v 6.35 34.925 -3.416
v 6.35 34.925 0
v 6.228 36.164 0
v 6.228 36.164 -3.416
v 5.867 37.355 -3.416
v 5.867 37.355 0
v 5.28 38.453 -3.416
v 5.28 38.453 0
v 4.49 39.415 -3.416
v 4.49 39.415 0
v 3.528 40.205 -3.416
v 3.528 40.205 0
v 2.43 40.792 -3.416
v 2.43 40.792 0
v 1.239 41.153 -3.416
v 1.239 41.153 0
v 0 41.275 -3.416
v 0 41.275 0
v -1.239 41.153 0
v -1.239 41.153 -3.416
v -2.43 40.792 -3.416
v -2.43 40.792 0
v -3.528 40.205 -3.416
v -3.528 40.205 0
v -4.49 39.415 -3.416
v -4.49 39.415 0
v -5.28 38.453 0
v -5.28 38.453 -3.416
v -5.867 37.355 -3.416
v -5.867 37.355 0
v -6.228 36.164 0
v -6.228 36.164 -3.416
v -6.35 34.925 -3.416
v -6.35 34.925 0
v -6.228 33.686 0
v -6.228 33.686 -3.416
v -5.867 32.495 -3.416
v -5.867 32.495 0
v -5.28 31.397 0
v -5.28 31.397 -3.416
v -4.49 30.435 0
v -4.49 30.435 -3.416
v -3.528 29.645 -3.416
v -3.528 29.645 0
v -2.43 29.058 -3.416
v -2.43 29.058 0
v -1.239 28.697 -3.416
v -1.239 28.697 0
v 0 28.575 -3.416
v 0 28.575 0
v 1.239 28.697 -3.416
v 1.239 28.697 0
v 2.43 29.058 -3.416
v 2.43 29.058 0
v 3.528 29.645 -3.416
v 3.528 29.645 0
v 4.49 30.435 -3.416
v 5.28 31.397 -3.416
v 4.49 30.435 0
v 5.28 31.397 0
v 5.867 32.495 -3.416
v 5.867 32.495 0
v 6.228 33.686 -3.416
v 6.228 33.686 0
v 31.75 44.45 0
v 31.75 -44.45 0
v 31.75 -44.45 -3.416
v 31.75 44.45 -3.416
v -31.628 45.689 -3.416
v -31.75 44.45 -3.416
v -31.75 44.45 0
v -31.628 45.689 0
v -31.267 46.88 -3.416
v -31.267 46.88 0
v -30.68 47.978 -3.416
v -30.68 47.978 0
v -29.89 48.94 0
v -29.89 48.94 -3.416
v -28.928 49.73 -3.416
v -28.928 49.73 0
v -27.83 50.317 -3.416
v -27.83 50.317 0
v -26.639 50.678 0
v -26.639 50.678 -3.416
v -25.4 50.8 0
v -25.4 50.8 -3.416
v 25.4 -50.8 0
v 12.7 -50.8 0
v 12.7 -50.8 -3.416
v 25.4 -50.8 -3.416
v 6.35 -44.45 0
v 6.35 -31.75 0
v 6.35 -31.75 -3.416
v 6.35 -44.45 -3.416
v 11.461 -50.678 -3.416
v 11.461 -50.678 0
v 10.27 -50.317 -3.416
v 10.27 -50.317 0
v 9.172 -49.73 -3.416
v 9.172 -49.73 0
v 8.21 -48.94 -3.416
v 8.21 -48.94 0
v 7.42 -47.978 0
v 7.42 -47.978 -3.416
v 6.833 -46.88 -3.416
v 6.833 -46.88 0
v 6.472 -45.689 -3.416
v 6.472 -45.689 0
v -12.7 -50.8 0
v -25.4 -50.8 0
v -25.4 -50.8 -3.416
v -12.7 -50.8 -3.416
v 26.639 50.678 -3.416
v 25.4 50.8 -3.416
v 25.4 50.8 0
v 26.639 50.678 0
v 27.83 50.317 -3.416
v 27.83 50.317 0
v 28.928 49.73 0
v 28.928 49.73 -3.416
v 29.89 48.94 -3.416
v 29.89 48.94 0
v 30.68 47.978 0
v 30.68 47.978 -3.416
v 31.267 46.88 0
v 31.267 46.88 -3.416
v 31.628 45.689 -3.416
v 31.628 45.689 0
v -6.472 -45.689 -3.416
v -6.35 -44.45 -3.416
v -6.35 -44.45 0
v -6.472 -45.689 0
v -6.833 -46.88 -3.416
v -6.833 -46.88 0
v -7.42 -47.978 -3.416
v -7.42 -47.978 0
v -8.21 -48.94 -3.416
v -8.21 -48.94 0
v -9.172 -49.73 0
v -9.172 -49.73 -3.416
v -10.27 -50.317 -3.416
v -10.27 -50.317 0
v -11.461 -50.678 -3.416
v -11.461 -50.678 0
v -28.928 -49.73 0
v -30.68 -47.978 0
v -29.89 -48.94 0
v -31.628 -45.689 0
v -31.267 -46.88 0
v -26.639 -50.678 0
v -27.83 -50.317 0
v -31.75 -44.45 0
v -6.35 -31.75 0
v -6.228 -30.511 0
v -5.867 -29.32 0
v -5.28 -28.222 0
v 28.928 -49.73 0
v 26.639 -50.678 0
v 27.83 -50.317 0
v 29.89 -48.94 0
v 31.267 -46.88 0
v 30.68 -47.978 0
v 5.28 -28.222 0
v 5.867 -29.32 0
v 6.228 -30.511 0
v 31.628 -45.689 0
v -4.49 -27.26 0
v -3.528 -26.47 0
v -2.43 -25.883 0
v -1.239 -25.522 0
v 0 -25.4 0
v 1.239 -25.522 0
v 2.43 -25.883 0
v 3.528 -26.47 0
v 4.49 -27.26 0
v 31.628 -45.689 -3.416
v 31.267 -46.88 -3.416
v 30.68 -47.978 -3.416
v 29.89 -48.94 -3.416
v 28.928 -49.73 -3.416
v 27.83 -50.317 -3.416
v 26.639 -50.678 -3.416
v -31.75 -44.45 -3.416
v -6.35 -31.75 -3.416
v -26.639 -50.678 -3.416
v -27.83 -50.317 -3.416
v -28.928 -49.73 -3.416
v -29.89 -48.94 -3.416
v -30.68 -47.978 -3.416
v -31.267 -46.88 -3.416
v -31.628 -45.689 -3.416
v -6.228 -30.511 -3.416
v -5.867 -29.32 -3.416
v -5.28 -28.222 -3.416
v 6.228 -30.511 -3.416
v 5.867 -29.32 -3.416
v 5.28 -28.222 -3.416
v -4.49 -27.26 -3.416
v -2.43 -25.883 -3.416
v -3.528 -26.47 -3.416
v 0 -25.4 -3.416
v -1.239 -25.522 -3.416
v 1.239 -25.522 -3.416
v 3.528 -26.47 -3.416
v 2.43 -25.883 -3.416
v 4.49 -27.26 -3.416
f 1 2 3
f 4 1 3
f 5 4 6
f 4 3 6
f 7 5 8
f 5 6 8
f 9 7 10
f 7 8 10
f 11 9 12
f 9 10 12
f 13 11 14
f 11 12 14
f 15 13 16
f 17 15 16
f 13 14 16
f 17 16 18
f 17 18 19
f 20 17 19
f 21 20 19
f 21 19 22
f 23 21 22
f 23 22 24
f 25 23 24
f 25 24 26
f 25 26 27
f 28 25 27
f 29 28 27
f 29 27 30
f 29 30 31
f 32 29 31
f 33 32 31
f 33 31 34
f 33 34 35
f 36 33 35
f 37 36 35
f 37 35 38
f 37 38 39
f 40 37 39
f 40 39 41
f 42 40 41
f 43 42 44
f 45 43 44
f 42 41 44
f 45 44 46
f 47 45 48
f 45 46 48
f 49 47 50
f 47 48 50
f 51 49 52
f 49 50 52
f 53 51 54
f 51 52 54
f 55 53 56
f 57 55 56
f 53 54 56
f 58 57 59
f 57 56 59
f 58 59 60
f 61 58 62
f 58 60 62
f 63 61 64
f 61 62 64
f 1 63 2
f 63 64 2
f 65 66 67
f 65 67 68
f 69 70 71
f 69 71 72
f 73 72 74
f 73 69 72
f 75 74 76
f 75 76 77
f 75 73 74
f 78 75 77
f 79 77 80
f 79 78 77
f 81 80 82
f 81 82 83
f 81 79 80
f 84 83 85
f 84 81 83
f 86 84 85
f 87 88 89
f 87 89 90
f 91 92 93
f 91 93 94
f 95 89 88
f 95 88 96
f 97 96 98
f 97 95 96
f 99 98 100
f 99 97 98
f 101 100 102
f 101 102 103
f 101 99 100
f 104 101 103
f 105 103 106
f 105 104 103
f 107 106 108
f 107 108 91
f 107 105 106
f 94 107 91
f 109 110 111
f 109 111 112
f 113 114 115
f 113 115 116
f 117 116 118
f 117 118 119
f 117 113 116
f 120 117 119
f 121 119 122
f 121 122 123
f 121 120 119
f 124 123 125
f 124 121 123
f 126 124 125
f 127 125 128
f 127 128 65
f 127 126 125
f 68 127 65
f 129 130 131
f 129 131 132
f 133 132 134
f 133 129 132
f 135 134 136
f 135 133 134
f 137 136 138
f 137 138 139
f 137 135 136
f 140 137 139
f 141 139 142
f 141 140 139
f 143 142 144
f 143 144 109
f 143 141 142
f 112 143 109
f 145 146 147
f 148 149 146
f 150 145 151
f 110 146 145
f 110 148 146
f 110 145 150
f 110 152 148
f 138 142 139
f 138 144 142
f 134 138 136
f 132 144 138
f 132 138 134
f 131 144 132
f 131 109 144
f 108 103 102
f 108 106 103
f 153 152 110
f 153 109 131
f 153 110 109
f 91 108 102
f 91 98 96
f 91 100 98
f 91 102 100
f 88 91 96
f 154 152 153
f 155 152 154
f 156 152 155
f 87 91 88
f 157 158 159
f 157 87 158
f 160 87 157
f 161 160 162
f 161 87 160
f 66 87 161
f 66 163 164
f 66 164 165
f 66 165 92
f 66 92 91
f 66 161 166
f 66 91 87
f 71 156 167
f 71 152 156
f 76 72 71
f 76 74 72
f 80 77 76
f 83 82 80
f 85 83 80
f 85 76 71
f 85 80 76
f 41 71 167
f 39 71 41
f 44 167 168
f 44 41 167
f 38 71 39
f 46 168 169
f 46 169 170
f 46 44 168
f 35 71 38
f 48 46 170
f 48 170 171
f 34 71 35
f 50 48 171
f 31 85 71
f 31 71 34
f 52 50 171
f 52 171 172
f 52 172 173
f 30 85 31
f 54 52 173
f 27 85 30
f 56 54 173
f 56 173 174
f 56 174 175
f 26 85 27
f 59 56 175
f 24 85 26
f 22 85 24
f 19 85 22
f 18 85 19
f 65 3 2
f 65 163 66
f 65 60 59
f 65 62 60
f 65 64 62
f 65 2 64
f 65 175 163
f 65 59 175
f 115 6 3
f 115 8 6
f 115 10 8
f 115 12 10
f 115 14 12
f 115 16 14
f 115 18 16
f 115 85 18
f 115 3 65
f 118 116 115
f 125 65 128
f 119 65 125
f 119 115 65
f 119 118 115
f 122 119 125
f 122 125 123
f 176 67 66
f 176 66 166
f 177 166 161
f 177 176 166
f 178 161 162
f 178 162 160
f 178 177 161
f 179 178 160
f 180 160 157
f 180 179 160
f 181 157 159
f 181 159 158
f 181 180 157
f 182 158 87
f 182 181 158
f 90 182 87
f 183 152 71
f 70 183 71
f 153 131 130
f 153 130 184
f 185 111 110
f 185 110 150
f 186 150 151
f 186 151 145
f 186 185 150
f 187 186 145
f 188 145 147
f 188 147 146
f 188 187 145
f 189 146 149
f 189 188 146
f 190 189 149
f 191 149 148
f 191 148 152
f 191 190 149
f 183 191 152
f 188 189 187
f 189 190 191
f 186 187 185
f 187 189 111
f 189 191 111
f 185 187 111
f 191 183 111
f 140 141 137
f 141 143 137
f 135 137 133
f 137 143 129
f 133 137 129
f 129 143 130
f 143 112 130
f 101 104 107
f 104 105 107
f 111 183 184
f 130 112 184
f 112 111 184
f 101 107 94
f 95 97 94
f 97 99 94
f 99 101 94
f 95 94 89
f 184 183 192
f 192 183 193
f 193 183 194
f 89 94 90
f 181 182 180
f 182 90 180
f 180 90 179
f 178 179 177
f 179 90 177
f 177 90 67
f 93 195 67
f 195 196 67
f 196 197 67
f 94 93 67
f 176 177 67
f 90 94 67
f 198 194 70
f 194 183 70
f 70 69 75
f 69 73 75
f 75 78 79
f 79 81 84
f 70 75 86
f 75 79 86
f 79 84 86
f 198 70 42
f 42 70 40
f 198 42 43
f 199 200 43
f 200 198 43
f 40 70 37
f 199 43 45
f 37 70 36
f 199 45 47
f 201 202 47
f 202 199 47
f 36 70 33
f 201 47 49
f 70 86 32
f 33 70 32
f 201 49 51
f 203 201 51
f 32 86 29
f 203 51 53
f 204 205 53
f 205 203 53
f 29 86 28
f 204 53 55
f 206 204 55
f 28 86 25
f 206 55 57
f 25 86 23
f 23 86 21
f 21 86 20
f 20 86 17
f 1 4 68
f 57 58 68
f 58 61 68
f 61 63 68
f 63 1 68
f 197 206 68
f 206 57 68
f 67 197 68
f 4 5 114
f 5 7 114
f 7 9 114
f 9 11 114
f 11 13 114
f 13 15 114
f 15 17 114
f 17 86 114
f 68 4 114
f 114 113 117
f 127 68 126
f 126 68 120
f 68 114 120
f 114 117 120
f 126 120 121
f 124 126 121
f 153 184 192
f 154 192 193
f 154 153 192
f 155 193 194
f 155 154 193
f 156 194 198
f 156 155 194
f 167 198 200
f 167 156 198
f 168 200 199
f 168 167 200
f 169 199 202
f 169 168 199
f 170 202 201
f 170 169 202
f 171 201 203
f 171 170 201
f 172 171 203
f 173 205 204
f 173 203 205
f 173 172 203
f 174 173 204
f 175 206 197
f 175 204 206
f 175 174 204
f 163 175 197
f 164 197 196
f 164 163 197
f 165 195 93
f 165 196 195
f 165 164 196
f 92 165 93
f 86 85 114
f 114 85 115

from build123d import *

# Parameters (mm, degrees)
CROQUIS1_W            = 63.5
CROQUIS1_H            = 101.6
BRIDA_BASE1_DEPTH     = 3.4163
CROQUIS2_R            = 6.35
CORTAR_EXTRUIR1_DEPTH = 61.0031133
ROMPER_START          = -3.4163
ROMPER_ESQUINA1_DEPTH = 3.4163


# Read off the part's stored shape, not the designer's step: Romper esquina1
# Sheet-metal steps are written as plain solids
with BuildPart() as part:
    # Croquis1 → Brida base1 (new body)
    with BuildSketch(Plane.XY):
        Rectangle(CROQUIS1_W, CROQUIS1_H)
    extrude(amount=-BRIDA_BASE1_DEPTH)

    # Croquis2 → Cortar-Extruir1 (cut, through all)
    with BuildSketch(Plane.XY):
        with Locations((0, 34.925)):
            Circle(CROQUIS2_R)
        with BuildLine():
            Line((6.35, -31.75), (6.35, -50.8))
            ThreePointArc((6.35, -50.8), (0, -57.15), (-6.35, -50.8))
            Line((-6.35, -50.8), (-6.35, -31.75))
            ThreePointArc((-6.35, -31.75), (0, -25.4), (6.35, -31.75))
        make_face()
    extrude(amount=-CORTAR_EXTRUIR1_DEPTH, mode=Mode.SUBTRACT)

    # Romper esquina1 outline → Romper esquina1 (cut)
    with BuildSketch(Plane.XY.offset(ROMPER_START)):
        with BuildLine():
            Line((6.35, -50.8), (12.7, -50.8))
            ThreePointArc((12.7, -50.8), (8.209871939, -48.940128061), (6.35, -44.45))
            Line((6.35, -44.45), (6.35, -50.8))
        make_face()
        with BuildLine():
            ThreePointArc((-6.35, -44.45), (-8.209871939, -48.940128061), (-12.7, -50.8))
            Line((-12.7, -50.8), (-6.35, -50.8))
            Line((-6.35, -50.8), (-6.35, -44.45))
        make_face()
        with BuildLine():
            ThreePointArc((-25.4, -50.8), (-29.890128061, -48.940128061), (-31.75, -44.45))
            Line((-31.75, -44.45), (-31.75, -50.8))
            Line((-31.75, -50.8), (-25.4, -50.8))
        make_face()
        with BuildLine():
            ThreePointArc((-31.75, 44.45), (-29.890128061, 48.940128061), (-25.4, 50.8))
            Line((-25.4, 50.8), (-31.75, 50.8))
            Line((-31.75, 50.8), (-31.75, 44.45))
        make_face()
        with BuildLine():
            ThreePointArc((25.4, 50.8), (29.890128061, 48.940128061), (31.75, 44.45))
            Line((31.75, 44.45), (31.75, 50.8))
            Line((31.75, 50.8), (25.4, 50.8))
        make_face()
        with BuildLine():
            ThreePointArc((31.75, -44.45), (29.890128061, -48.940128061), (25.4, -50.8))
            Line((25.4, -50.8), (31.75, -50.8))
            Line((31.75, -50.8), (31.75, -44.45))
        make_face()
    extrude(amount=ROMPER_ESQUINA1_DEPTH, mode=Mode.SUBTRACT)


solid = part.part
